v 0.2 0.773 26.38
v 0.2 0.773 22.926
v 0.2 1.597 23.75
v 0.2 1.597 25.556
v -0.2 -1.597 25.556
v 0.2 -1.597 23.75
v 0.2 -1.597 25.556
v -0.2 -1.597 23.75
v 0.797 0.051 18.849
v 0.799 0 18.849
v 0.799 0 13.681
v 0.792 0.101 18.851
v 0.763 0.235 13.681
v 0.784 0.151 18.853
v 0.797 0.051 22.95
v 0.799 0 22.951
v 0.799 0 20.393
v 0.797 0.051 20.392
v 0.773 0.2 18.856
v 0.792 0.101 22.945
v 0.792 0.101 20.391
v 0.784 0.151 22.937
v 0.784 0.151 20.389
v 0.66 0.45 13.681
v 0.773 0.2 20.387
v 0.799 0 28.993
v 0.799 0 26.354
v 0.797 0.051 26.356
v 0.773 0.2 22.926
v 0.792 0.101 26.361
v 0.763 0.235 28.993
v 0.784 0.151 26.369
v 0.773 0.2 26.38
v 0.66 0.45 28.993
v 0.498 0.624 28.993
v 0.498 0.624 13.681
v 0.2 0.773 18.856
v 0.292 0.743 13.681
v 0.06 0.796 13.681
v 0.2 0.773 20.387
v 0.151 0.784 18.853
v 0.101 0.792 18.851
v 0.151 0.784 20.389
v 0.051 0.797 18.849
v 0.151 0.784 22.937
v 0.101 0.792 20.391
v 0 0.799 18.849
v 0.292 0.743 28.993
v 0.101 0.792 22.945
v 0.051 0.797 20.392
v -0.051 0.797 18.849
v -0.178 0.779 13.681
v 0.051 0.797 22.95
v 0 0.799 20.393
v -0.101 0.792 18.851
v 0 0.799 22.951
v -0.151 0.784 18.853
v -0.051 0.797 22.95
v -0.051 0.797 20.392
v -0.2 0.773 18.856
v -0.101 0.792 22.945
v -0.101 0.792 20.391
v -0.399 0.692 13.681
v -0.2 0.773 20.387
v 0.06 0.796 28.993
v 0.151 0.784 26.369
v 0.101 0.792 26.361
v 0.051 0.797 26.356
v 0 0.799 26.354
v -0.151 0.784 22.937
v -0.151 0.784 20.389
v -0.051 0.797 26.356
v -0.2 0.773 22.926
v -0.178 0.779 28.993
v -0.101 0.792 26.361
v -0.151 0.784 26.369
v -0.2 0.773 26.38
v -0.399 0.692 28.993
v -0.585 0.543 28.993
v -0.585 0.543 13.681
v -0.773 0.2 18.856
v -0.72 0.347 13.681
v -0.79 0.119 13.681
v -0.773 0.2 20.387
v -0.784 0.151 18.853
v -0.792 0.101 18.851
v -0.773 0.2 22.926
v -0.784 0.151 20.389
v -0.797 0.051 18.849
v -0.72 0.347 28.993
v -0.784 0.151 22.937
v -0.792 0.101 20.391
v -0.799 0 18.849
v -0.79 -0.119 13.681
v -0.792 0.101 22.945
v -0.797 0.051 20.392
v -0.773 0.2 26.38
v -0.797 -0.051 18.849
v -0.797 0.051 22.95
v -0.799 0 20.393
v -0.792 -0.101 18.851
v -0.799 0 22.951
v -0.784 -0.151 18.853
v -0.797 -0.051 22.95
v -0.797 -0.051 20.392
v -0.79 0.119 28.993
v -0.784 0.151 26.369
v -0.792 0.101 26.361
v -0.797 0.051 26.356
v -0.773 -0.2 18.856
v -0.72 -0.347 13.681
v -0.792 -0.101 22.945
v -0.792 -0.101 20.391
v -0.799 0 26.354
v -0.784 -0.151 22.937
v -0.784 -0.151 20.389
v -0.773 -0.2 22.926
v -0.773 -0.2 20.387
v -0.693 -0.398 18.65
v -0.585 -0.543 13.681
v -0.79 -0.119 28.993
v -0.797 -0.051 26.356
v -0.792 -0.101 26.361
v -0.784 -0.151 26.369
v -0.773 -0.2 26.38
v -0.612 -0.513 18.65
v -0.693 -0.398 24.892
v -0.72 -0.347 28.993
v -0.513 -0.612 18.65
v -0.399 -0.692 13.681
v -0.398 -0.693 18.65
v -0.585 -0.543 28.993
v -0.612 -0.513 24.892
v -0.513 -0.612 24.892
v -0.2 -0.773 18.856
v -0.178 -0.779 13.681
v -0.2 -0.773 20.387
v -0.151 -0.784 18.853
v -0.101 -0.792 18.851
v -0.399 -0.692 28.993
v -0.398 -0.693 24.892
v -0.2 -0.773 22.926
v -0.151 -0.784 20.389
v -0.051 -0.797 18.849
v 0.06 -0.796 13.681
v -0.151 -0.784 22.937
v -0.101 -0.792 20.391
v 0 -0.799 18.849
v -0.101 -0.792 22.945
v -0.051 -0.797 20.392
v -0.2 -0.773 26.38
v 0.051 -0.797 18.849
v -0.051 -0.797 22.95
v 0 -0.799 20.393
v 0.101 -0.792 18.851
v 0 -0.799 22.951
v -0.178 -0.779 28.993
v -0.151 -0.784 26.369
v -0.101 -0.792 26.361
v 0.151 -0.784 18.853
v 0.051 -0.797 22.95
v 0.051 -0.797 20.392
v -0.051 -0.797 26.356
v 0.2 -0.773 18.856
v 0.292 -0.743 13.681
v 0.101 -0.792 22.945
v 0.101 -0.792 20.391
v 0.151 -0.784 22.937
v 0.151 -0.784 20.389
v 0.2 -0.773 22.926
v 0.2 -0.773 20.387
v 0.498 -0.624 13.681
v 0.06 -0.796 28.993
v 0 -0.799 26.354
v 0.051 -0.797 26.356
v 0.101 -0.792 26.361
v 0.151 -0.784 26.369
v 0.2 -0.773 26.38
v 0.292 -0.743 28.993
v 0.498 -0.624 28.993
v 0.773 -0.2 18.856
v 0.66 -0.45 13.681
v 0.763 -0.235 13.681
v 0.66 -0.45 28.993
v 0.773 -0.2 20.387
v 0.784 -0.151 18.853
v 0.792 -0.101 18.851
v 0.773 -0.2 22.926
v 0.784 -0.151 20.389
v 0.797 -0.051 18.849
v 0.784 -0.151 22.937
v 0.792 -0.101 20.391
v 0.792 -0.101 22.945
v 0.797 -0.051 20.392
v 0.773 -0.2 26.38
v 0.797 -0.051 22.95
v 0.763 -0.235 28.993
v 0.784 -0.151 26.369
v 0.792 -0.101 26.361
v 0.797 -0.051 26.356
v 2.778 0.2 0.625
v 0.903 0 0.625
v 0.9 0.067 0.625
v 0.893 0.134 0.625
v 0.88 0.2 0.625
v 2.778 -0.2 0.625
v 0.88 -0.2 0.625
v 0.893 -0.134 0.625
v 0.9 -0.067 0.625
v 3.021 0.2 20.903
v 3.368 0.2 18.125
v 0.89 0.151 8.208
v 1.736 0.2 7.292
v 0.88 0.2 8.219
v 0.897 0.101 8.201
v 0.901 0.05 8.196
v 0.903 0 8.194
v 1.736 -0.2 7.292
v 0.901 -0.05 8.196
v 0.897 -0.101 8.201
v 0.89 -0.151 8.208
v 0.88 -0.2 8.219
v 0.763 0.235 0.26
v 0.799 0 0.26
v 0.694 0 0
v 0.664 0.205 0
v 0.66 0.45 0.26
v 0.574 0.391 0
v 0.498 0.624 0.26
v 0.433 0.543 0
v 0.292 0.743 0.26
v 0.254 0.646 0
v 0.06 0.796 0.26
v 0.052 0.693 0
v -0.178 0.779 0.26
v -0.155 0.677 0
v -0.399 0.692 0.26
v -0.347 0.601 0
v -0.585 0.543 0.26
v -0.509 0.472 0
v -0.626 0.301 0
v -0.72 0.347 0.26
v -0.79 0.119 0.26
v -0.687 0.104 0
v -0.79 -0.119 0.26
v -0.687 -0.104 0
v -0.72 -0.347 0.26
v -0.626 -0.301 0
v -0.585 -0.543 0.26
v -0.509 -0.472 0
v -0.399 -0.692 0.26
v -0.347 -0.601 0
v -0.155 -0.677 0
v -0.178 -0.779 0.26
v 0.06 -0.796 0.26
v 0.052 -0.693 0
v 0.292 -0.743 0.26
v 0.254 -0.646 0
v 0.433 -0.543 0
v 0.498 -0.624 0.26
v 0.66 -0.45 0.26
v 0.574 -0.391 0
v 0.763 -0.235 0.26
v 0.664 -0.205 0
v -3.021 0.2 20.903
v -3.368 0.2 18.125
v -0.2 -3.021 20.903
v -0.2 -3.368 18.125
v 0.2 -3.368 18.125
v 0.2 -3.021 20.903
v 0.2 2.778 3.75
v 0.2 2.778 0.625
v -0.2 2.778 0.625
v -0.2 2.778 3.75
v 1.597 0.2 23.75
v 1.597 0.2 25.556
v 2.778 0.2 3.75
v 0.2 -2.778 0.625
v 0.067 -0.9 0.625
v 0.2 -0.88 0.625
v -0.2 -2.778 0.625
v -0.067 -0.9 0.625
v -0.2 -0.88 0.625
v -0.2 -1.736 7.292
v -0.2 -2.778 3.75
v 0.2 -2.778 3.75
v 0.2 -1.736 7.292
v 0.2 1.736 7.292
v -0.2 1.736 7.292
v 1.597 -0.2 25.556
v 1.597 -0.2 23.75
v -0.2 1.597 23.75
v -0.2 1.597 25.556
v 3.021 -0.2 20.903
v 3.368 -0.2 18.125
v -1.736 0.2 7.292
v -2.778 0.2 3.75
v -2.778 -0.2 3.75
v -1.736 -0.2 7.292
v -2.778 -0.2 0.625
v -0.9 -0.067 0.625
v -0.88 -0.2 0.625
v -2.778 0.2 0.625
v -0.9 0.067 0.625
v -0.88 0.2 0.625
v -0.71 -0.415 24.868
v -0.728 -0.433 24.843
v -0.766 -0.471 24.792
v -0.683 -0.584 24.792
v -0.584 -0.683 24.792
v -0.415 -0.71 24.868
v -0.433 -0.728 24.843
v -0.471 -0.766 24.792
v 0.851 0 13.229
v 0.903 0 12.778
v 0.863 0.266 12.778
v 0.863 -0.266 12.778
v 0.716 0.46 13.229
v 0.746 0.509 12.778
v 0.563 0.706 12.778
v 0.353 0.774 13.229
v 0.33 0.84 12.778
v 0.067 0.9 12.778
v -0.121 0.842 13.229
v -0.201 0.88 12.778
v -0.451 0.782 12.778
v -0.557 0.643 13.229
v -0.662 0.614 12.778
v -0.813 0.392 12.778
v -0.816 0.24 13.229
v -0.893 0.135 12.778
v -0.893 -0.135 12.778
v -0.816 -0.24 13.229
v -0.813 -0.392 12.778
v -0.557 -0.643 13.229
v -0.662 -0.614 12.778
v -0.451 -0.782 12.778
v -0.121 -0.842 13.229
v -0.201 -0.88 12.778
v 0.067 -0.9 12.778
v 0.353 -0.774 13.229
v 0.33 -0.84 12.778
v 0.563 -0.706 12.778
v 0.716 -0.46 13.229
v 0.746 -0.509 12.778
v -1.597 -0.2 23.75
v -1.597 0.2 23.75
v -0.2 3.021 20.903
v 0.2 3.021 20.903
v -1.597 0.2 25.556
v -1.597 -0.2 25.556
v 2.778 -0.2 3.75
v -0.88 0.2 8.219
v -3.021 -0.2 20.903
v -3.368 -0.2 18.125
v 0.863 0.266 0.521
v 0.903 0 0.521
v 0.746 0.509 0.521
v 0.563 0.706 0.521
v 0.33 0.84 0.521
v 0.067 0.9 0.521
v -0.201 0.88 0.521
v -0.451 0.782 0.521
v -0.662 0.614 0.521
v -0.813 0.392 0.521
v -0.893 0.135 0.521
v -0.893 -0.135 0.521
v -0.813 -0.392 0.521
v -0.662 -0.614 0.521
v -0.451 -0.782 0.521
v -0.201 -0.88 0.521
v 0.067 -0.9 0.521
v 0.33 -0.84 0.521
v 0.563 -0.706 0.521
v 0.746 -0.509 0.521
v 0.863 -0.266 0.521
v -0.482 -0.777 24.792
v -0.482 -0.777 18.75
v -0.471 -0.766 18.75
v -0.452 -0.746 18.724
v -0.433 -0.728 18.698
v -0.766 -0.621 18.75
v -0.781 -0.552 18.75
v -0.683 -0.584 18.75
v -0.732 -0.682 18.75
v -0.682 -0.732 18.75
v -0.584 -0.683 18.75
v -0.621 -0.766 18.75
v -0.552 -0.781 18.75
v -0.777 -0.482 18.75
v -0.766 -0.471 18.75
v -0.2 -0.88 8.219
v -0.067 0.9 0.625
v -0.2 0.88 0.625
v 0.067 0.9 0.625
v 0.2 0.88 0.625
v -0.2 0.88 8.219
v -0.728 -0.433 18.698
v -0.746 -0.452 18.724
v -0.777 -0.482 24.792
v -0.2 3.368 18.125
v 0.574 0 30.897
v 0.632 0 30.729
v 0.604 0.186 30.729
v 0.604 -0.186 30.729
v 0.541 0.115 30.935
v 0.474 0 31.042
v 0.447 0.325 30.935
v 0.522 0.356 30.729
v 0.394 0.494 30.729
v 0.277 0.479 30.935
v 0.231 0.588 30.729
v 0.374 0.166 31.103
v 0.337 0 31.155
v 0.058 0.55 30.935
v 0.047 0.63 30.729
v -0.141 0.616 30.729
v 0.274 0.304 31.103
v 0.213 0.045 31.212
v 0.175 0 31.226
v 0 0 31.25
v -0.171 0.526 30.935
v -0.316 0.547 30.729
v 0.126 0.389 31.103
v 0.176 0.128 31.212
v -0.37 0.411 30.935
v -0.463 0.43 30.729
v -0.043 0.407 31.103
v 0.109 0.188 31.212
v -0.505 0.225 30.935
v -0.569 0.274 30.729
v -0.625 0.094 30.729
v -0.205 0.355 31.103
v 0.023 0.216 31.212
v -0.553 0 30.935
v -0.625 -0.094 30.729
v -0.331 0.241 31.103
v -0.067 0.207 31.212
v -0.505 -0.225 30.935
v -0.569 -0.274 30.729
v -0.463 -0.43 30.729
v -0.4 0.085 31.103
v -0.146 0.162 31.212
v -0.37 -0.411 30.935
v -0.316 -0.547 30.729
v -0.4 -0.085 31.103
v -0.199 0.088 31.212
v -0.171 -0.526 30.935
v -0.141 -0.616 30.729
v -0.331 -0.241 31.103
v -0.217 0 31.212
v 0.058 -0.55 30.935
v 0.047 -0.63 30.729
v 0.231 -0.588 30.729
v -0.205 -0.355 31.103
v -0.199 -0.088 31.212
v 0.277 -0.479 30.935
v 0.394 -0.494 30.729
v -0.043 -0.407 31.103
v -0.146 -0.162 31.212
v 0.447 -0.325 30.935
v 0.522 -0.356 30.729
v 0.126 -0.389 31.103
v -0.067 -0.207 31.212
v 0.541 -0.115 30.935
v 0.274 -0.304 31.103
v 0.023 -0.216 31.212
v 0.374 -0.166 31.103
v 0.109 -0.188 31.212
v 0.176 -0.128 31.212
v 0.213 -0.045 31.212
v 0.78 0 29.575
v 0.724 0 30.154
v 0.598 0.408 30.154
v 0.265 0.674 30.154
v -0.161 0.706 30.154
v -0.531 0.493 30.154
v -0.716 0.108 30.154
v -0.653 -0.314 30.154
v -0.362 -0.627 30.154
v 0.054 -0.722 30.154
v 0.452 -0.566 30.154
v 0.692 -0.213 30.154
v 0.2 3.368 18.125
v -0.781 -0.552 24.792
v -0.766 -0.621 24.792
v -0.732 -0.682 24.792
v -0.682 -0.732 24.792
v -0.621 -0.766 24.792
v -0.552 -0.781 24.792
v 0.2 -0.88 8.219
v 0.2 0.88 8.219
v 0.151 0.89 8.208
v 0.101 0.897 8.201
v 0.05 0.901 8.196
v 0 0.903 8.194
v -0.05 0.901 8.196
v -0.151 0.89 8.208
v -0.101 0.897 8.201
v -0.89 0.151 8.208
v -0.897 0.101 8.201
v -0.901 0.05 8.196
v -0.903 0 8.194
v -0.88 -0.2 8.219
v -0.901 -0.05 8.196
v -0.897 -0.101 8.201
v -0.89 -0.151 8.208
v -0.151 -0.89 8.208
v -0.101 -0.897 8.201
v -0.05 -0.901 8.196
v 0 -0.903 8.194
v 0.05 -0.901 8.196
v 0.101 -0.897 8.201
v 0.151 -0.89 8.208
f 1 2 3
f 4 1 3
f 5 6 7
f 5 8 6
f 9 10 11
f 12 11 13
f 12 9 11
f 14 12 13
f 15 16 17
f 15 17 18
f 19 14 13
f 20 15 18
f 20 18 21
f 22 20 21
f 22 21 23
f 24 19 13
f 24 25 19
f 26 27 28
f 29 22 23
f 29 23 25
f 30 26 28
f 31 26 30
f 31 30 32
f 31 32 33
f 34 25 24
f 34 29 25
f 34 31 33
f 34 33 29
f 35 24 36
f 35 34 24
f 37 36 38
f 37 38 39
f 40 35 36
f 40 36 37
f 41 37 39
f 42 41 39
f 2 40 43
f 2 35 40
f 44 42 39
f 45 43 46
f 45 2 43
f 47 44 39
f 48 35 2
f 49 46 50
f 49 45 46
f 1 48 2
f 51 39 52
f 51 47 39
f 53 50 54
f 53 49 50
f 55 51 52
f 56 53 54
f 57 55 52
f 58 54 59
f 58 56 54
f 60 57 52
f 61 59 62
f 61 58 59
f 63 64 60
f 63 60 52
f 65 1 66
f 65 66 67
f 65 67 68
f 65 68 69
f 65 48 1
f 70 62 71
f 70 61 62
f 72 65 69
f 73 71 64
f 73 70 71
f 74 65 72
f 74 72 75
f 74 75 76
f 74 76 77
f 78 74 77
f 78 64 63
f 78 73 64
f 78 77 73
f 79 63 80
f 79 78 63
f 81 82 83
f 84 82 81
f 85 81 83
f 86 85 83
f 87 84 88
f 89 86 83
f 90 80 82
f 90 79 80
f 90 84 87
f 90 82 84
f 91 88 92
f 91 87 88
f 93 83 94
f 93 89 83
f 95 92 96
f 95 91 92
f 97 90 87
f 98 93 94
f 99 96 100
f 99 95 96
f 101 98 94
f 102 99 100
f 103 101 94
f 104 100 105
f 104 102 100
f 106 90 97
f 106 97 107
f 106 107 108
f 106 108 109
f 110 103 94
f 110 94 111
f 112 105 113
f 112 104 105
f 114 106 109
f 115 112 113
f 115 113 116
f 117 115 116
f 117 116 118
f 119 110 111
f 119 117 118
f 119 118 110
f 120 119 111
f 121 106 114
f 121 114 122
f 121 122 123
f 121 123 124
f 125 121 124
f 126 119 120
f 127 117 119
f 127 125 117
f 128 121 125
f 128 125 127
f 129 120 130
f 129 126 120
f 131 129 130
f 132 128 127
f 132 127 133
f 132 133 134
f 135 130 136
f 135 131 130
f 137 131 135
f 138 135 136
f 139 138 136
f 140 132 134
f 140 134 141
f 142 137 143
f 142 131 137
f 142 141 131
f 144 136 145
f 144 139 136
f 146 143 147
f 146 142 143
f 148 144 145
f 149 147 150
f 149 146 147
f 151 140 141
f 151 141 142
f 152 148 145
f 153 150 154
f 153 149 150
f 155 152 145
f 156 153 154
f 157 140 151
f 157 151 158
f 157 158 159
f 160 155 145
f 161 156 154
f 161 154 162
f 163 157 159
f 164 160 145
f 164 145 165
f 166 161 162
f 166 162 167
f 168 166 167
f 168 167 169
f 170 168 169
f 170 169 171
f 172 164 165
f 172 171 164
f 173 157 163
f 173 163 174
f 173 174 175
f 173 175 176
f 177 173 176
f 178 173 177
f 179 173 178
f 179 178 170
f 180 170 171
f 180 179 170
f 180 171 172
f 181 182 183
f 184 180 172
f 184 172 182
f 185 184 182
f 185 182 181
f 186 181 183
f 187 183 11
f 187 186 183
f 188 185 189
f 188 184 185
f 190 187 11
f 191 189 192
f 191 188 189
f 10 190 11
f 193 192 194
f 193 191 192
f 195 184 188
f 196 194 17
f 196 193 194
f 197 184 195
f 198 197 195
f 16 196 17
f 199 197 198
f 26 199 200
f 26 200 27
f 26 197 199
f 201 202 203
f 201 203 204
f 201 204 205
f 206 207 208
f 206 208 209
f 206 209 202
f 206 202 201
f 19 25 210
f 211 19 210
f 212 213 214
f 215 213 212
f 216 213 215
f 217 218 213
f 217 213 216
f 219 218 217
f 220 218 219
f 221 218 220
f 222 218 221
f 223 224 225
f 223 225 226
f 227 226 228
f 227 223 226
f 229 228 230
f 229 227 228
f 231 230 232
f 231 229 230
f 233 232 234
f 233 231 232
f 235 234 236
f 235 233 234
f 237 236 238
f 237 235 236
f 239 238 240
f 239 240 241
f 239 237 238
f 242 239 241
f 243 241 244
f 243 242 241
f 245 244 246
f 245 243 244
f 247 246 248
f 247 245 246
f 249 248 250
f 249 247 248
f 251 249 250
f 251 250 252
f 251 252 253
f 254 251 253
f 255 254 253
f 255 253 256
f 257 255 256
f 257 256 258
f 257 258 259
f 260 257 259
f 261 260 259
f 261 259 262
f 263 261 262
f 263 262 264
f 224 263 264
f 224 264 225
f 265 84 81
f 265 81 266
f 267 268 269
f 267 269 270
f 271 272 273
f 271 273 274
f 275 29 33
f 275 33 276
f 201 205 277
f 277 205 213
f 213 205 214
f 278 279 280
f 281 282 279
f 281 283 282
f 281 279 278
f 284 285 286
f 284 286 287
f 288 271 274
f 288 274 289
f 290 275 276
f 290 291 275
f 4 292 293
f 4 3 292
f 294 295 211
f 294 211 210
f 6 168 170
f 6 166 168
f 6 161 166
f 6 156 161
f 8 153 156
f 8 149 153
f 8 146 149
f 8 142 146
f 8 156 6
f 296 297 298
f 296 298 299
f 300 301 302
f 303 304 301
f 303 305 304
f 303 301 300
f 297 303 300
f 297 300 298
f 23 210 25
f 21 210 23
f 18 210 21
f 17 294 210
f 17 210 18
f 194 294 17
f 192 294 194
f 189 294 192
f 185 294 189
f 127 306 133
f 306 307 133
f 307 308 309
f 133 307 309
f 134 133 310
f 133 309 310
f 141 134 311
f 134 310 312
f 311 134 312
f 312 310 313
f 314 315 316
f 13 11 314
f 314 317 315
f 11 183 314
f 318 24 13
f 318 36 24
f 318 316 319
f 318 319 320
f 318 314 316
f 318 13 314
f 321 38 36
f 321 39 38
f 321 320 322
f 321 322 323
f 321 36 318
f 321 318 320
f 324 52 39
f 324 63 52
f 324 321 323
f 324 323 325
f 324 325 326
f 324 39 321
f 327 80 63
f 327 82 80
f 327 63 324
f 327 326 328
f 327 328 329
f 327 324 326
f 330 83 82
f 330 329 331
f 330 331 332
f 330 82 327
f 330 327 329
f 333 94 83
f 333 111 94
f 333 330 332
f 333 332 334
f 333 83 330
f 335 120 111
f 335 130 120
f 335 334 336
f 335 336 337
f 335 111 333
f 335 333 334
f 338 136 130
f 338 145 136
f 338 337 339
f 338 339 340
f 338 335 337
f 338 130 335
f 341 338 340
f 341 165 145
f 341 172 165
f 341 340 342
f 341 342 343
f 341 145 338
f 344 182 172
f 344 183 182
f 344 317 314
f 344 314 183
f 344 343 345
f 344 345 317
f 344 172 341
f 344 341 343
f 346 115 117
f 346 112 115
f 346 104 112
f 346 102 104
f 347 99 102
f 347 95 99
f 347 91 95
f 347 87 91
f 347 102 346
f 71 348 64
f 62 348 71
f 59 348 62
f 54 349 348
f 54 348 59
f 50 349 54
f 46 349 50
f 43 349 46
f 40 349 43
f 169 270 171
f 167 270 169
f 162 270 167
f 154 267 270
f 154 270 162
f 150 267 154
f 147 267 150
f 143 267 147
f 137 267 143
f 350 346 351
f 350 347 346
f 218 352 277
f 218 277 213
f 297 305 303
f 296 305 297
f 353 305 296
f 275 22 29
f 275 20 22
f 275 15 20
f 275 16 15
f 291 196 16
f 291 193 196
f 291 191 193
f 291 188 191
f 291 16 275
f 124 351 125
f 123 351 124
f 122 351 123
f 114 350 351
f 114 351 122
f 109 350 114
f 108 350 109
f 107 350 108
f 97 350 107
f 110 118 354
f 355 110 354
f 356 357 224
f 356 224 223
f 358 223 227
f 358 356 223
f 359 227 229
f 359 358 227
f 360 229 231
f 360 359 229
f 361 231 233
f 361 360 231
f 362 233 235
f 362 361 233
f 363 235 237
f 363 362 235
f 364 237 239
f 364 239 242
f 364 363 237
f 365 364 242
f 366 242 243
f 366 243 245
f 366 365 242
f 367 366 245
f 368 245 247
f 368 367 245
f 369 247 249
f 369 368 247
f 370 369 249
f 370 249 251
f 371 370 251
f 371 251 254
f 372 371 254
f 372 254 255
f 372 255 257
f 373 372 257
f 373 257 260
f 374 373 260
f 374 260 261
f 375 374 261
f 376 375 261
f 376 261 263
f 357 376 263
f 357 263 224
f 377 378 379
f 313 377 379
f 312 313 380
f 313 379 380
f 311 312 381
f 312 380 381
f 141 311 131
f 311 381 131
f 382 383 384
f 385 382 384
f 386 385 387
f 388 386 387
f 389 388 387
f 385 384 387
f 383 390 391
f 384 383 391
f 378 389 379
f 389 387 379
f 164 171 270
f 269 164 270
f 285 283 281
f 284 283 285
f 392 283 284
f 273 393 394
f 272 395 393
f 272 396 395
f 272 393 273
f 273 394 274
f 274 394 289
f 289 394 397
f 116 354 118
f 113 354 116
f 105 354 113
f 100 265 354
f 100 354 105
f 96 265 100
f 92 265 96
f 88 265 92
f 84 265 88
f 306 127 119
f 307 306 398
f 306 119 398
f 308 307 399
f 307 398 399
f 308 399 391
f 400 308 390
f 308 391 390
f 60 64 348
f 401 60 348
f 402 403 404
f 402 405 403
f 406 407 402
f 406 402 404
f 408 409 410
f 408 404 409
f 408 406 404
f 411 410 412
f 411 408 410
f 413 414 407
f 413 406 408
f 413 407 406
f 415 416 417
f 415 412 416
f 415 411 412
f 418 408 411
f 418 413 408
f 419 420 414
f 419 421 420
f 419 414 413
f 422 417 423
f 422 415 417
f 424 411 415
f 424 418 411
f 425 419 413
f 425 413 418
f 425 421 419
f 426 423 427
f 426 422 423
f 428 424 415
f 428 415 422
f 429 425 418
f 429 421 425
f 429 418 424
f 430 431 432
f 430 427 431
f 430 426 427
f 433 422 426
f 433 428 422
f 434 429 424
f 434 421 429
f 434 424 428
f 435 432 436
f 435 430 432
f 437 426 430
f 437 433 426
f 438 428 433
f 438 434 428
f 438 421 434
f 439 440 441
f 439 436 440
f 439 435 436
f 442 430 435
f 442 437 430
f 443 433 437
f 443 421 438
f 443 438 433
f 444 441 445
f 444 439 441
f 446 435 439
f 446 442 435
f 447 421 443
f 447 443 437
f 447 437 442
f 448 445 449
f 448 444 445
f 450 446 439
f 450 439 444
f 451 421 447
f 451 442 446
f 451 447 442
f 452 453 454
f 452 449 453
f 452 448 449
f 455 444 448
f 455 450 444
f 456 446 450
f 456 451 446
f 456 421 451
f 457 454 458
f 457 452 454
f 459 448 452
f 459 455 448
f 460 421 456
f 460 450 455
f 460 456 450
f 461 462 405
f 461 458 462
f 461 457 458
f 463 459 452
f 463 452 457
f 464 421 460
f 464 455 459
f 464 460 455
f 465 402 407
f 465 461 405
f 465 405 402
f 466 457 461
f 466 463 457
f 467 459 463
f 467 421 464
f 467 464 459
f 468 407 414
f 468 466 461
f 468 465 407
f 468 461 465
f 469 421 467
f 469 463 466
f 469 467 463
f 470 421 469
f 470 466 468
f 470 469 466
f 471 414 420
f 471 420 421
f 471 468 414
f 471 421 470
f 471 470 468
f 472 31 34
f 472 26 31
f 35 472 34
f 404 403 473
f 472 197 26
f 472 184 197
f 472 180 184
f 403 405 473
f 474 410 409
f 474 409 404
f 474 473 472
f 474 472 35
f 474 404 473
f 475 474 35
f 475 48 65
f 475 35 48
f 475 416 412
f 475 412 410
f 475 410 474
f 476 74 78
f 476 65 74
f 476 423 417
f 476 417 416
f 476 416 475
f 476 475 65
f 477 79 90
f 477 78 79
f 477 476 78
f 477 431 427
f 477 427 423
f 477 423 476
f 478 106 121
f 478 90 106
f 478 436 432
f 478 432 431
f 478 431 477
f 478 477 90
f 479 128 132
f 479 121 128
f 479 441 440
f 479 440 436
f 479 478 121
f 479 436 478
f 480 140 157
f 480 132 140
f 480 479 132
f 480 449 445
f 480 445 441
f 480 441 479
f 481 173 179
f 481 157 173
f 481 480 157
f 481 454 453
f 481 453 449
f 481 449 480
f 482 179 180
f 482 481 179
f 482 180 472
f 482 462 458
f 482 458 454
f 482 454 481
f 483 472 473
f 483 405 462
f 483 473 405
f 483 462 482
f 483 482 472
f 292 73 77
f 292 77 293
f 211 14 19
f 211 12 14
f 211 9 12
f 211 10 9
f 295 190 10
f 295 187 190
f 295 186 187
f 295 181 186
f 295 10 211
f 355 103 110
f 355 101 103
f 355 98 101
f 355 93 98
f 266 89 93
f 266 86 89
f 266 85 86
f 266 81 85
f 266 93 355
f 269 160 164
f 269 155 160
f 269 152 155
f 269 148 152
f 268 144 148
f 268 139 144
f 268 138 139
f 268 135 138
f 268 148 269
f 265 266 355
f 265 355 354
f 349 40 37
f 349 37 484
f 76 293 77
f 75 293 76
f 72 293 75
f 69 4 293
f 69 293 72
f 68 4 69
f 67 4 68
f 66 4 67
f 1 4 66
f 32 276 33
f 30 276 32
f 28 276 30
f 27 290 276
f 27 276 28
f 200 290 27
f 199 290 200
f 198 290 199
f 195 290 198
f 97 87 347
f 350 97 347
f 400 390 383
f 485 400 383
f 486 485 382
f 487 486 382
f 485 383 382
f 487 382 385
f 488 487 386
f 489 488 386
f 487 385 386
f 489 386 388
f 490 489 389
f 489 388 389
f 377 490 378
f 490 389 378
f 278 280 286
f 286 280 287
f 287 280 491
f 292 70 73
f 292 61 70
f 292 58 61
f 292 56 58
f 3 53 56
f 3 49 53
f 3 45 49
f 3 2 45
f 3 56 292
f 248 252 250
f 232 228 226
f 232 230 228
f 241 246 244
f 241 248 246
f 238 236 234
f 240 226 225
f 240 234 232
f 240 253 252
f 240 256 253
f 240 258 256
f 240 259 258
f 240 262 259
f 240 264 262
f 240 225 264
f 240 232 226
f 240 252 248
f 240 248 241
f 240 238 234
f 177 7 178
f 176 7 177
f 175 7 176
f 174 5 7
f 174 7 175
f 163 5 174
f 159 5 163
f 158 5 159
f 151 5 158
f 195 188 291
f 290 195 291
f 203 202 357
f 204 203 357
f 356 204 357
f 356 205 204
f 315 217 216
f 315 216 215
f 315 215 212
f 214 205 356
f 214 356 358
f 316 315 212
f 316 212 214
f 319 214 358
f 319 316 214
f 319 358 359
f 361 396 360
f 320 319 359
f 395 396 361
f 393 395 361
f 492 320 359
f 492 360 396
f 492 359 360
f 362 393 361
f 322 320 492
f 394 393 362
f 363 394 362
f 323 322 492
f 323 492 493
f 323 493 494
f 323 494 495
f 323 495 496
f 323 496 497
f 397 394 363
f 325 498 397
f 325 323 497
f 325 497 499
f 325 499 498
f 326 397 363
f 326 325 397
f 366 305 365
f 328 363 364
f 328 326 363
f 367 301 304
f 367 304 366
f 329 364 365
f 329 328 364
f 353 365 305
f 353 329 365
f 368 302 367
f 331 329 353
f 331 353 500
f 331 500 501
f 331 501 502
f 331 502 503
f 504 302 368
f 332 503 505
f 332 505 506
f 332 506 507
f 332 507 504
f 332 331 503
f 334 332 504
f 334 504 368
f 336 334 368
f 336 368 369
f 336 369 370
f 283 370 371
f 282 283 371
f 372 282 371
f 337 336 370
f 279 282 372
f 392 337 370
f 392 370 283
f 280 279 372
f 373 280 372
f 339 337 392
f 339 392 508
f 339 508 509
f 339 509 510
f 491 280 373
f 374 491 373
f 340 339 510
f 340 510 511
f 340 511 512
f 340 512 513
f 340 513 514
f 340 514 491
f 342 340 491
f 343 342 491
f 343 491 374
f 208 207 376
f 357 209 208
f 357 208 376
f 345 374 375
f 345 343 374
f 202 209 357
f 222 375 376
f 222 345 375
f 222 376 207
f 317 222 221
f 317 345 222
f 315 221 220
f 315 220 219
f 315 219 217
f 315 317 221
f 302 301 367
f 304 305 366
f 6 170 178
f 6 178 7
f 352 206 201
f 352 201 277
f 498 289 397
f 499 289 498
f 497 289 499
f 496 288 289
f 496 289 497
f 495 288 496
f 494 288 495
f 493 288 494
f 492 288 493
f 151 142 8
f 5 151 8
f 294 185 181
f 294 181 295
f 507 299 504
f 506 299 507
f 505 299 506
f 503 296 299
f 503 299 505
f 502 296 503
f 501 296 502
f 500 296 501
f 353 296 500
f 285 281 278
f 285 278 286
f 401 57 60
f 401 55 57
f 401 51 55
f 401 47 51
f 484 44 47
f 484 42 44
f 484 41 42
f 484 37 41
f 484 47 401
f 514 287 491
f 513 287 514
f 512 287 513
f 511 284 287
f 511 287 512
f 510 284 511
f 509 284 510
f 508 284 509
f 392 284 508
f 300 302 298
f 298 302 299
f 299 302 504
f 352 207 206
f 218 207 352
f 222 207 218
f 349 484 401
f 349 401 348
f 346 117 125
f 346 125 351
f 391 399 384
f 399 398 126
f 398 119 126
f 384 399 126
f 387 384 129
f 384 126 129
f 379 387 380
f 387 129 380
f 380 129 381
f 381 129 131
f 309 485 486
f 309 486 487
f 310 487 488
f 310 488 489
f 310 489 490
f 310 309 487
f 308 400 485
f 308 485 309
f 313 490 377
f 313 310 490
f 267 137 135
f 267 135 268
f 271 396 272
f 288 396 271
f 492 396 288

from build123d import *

# Parameters (mm, degrees)
F4_DEPTH = 0.2
F5_COUNT = 4
F8_DEPTH = 6.0416666667
F9_SIZE  = 0.1


with BuildPart() as f2:
    # F1 (on Front) → F2 (revolve)
    with BuildSketch(Plane.XZ):
        Polygon((0.7986111111, 13.6805555556), (0.7986111111, 0.2604166667), (0.9027777778, 0.5208333333), (0.9027777778, 12.7777777778), align=None)
        with BuildLine():
            Line((0, 31.25), (0, 0))
            Line((0, 0), (0.6944444444, 0))
            Line((0.6944444444, 0), (0.7986111111, 0.2604166667))
            Line((0.7986111111, 0.2604166667), (0.7986111111, 13.6805555556))
            Line((0.7986111111, 13.6805555556), (0.7986111111, 28.9930555556))
            ThreePointArc((0.7986111111, 28.9930555556), (0.7567775283, 29.8651154933), (0.6316609682, 30.7291666667))
            ThreePointArc((0.6316609682, 30.7291666667), (0.4093479388, 31.1030002792), (0, 31.25))
        make_face()
    revolve(axis=Axis((0, 0, 15.625), (0, 0, 1)))

    # F3 (on Front) → F4 (join, symmetric)
    with BuildSketch(Plane.XZ):
        Polygon((0, 27.1527777778), (0, 0.625), (2.7777777778, 0.625), (2.7777777778, 3.75), (1.7361111111, 7.2916666667), (0.4, 8.7391203704), (0.4, 18.9610719875), (3.3680555556, 18.125), (3.0208333333, 20.9027777778), (0.4, 20.3012750455), (0.4, 22.5527777778), (1.5972222222, 23.75), (1.5972222222, 25.5555555556), align=None)
    extrude(amount=F4_DEPTH, both=True)

    # F5: F2 ×4 about axis
    f5_axis = Axis((0, 0, 13.6805555556), (0, 0, 1))


with BuildPart() as f2_1:
    add(f2.part)
    for i in range(1, F5_COUNT):
        add(f2.part.rotate(f5_axis, i * 360 / F5_COUNT))

    # F7 (on offset) → F8 (join)
    with BuildSketch(Plane.XY.offset(18.75)):
        with BuildLine():
            Line((-0.4822828892, -0.777240922), (-0.0760130179, -0.3709710507))
            Line((-0.0760130179, -0.3709710507), (-0.3709710507, -0.0760130179))
            Line((-0.3709710507, -0.0760130179), (-0.777240922, -0.4822828892))
            ThreePointArc((-0.777240922, -0.4822828892), (-0.7090709667, -0.7090709667), (-0.4822828892, -0.777240922))
        make_face()
    extrude(amount=F8_DEPTH)

    # F9
    f9_edges = [f2_1.edges().sort_by_distance(p)[0] for p in [
        (-0.564703, -0.564703, 24.791667),
        (-0.564703, -0.564703, 18.75),
    ]]
    chamfer(f9_edges, length=F9_SIZE)


solid = f2_1.part
